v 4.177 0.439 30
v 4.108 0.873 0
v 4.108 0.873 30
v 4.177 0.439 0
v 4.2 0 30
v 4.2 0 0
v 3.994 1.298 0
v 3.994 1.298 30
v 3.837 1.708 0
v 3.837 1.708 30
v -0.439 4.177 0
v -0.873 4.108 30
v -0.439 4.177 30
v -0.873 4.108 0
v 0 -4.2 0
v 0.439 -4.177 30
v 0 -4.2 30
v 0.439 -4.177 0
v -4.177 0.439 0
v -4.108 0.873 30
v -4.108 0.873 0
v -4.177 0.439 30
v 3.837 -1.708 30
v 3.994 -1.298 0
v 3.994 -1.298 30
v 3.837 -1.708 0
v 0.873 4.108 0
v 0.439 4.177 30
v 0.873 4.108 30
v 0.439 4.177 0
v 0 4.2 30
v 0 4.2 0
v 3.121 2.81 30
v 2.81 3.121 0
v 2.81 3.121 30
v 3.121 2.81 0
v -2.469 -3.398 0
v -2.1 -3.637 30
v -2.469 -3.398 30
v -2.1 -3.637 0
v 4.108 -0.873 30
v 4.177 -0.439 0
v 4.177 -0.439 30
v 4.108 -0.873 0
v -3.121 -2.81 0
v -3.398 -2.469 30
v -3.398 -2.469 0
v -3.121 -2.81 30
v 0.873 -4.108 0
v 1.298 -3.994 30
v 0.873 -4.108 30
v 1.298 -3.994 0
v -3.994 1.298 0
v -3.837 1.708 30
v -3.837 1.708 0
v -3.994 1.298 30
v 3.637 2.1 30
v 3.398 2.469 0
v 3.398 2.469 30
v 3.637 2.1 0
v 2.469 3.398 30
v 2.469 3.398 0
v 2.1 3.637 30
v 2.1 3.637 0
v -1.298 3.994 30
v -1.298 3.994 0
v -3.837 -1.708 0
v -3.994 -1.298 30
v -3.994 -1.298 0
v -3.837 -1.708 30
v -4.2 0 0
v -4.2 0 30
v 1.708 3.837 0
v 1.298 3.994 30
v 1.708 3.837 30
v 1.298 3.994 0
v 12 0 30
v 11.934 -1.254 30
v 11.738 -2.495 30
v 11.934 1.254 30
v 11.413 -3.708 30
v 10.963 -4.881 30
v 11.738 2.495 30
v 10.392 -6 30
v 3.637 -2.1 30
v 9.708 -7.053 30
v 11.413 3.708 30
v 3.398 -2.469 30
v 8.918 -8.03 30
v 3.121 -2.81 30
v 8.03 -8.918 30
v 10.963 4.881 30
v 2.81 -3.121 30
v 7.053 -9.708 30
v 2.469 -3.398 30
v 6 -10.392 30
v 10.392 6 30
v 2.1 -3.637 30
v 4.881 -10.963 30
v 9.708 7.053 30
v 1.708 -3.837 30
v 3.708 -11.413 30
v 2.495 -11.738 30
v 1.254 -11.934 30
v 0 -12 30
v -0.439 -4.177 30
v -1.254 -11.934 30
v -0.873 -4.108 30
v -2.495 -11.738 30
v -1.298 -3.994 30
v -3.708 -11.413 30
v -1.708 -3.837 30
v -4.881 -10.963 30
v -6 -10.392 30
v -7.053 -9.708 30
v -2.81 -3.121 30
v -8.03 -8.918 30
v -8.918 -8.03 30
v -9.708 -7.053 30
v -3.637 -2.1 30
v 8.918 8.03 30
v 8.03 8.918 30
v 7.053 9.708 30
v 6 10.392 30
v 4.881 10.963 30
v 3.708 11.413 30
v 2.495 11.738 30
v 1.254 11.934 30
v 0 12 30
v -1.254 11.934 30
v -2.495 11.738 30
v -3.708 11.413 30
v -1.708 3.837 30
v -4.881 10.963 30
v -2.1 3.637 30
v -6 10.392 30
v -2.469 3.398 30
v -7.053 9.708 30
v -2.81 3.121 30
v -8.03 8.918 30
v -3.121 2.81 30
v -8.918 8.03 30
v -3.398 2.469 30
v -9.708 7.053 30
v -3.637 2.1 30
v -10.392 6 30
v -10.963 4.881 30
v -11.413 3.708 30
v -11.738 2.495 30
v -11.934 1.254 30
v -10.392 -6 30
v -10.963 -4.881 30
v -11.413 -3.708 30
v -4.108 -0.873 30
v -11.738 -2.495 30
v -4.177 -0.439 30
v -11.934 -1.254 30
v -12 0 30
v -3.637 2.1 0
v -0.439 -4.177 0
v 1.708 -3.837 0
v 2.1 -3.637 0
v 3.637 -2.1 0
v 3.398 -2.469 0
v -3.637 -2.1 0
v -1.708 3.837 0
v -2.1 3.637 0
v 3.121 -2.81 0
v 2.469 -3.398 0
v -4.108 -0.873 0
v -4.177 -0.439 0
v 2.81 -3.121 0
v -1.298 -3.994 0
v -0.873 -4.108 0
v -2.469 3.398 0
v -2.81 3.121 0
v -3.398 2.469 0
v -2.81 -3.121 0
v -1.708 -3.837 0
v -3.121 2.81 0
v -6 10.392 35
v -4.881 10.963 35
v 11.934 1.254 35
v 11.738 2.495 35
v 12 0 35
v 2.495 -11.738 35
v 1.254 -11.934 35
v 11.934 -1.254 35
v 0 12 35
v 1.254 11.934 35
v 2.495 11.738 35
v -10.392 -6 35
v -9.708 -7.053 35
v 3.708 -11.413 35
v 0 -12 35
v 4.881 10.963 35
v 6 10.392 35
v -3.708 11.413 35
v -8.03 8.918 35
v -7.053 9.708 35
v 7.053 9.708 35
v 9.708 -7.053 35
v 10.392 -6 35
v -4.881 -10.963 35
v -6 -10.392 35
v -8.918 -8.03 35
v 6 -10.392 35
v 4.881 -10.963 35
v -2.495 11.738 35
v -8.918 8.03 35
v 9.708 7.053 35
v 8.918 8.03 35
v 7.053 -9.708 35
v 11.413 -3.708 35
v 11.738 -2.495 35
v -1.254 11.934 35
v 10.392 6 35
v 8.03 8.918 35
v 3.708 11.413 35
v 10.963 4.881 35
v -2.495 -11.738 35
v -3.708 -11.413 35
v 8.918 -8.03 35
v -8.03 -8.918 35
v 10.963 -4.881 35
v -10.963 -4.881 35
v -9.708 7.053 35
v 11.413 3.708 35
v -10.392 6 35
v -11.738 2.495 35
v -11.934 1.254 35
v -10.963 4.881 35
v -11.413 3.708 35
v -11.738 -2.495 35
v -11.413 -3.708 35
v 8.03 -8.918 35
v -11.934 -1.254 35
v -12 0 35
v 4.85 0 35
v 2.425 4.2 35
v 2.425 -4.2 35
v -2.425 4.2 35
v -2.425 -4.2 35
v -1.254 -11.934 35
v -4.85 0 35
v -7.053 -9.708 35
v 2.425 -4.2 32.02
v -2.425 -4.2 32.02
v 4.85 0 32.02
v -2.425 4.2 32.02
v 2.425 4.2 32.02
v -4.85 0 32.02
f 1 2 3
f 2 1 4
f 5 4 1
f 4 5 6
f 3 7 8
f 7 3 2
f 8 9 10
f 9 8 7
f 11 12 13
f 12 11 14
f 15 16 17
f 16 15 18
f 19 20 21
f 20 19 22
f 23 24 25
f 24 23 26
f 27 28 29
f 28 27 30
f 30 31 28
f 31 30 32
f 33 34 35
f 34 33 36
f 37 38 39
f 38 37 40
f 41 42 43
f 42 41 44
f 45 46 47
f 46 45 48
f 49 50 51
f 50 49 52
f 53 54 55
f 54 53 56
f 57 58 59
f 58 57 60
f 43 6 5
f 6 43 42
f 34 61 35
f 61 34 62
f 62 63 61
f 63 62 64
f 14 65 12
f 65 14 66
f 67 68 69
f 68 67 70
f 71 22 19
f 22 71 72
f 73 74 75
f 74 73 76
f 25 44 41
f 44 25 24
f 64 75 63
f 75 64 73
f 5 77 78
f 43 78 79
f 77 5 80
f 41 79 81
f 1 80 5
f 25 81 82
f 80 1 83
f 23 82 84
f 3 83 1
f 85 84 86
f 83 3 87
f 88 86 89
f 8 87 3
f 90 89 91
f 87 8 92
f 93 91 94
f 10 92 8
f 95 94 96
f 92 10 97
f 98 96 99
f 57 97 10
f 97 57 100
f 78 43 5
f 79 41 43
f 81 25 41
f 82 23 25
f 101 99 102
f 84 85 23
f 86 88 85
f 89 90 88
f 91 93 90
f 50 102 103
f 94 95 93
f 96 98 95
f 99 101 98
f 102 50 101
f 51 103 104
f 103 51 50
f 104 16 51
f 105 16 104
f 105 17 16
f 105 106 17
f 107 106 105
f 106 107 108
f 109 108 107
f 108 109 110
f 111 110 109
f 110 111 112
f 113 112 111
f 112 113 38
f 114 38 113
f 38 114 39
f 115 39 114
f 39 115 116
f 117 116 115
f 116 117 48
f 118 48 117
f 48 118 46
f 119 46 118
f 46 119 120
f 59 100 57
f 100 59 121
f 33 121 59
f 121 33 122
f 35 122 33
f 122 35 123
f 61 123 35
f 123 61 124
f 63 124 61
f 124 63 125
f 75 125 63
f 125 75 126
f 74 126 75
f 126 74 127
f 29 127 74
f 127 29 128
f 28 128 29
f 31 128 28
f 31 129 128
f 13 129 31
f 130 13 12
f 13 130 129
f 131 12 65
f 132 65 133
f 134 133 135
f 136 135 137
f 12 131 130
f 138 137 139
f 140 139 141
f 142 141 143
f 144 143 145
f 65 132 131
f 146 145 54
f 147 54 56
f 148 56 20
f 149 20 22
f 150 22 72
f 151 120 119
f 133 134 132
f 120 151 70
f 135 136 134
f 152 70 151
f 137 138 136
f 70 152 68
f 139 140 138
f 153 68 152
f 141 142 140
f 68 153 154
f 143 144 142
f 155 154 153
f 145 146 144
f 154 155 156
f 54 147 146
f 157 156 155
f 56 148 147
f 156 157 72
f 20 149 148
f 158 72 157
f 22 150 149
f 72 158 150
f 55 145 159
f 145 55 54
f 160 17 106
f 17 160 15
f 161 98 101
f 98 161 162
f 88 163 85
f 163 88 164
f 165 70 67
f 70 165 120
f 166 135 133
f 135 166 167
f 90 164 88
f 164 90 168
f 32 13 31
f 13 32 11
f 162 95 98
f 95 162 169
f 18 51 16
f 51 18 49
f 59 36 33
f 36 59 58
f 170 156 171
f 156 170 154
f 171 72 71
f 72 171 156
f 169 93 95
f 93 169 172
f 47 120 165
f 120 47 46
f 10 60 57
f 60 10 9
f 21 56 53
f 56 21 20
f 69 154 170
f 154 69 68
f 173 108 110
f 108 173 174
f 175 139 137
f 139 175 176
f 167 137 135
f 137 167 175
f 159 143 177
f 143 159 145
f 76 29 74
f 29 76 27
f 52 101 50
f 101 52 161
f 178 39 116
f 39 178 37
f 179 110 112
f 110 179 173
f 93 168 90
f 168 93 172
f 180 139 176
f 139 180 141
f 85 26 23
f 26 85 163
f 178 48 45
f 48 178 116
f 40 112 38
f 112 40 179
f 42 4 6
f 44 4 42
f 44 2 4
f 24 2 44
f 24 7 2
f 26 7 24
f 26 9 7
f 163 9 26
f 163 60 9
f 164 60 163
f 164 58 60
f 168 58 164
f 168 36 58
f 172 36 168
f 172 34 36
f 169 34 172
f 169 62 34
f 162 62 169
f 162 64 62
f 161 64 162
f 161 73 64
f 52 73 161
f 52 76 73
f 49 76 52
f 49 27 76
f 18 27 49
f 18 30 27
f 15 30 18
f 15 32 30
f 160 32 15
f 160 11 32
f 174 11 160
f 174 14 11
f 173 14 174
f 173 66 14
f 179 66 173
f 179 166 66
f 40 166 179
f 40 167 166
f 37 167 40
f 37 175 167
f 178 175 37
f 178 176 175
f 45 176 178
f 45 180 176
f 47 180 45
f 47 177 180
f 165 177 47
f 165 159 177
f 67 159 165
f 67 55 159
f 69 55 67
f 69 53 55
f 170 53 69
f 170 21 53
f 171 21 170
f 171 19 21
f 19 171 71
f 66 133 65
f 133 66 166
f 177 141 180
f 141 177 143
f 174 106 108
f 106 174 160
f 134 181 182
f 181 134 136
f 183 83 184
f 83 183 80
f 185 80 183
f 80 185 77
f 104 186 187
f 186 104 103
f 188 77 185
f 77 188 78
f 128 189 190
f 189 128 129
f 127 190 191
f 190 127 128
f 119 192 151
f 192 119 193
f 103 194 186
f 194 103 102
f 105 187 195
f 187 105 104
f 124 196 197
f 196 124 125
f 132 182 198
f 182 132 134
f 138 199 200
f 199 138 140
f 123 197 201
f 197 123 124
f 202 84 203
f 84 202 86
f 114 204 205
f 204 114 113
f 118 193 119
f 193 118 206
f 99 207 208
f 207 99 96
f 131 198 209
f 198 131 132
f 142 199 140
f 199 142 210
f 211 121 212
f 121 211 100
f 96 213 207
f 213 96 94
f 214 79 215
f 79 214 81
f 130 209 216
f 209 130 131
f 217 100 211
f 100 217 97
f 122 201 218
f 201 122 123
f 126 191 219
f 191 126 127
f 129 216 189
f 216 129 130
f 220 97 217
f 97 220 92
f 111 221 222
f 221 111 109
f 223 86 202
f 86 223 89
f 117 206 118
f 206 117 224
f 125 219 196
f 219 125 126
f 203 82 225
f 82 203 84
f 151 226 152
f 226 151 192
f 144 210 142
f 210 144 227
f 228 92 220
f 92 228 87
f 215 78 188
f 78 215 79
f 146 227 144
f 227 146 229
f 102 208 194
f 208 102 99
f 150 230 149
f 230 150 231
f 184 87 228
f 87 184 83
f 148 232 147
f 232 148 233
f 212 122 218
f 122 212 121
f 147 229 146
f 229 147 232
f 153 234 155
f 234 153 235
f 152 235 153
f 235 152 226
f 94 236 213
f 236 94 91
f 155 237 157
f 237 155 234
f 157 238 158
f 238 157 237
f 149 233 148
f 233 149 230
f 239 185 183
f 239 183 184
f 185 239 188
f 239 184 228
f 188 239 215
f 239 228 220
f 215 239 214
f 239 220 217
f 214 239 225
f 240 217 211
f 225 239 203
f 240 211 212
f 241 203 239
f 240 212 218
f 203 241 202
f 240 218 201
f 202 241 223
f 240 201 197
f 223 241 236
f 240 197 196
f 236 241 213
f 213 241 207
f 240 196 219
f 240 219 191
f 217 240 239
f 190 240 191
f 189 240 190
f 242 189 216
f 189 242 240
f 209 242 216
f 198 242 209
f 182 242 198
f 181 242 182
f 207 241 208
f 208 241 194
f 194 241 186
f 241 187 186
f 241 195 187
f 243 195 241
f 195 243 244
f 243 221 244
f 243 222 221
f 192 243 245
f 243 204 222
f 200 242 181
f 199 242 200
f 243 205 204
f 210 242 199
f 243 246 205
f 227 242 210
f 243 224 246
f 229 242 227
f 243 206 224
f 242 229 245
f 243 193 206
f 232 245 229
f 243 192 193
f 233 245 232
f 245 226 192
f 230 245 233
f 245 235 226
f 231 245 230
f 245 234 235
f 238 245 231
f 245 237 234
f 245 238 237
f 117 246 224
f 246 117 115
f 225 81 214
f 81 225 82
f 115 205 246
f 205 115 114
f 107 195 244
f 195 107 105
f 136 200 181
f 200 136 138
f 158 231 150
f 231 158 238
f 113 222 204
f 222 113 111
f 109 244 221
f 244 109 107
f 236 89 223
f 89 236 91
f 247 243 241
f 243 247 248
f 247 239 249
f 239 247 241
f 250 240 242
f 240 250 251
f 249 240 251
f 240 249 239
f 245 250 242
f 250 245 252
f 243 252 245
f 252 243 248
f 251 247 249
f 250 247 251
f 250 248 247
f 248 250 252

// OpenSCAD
// Thumb screw, smooth-shank representation.
$fn = 60;
eps = 0.02;
shaft_d = 8.4;
head_d = 24;
shaft_l = 30;
head_h = 5;
difference() {
    union() { cylinder(d = shaft_d, h = shaft_l); translate([0, 0, shaft_l]) cylinder(d = head_d, h = head_h); }
    translate([0, 0, shaft_l + head_h - 3 + eps]) cylinder(d = head_d * 0.35 / cos(30), h = 3 + eps, $fn = 6);
}
